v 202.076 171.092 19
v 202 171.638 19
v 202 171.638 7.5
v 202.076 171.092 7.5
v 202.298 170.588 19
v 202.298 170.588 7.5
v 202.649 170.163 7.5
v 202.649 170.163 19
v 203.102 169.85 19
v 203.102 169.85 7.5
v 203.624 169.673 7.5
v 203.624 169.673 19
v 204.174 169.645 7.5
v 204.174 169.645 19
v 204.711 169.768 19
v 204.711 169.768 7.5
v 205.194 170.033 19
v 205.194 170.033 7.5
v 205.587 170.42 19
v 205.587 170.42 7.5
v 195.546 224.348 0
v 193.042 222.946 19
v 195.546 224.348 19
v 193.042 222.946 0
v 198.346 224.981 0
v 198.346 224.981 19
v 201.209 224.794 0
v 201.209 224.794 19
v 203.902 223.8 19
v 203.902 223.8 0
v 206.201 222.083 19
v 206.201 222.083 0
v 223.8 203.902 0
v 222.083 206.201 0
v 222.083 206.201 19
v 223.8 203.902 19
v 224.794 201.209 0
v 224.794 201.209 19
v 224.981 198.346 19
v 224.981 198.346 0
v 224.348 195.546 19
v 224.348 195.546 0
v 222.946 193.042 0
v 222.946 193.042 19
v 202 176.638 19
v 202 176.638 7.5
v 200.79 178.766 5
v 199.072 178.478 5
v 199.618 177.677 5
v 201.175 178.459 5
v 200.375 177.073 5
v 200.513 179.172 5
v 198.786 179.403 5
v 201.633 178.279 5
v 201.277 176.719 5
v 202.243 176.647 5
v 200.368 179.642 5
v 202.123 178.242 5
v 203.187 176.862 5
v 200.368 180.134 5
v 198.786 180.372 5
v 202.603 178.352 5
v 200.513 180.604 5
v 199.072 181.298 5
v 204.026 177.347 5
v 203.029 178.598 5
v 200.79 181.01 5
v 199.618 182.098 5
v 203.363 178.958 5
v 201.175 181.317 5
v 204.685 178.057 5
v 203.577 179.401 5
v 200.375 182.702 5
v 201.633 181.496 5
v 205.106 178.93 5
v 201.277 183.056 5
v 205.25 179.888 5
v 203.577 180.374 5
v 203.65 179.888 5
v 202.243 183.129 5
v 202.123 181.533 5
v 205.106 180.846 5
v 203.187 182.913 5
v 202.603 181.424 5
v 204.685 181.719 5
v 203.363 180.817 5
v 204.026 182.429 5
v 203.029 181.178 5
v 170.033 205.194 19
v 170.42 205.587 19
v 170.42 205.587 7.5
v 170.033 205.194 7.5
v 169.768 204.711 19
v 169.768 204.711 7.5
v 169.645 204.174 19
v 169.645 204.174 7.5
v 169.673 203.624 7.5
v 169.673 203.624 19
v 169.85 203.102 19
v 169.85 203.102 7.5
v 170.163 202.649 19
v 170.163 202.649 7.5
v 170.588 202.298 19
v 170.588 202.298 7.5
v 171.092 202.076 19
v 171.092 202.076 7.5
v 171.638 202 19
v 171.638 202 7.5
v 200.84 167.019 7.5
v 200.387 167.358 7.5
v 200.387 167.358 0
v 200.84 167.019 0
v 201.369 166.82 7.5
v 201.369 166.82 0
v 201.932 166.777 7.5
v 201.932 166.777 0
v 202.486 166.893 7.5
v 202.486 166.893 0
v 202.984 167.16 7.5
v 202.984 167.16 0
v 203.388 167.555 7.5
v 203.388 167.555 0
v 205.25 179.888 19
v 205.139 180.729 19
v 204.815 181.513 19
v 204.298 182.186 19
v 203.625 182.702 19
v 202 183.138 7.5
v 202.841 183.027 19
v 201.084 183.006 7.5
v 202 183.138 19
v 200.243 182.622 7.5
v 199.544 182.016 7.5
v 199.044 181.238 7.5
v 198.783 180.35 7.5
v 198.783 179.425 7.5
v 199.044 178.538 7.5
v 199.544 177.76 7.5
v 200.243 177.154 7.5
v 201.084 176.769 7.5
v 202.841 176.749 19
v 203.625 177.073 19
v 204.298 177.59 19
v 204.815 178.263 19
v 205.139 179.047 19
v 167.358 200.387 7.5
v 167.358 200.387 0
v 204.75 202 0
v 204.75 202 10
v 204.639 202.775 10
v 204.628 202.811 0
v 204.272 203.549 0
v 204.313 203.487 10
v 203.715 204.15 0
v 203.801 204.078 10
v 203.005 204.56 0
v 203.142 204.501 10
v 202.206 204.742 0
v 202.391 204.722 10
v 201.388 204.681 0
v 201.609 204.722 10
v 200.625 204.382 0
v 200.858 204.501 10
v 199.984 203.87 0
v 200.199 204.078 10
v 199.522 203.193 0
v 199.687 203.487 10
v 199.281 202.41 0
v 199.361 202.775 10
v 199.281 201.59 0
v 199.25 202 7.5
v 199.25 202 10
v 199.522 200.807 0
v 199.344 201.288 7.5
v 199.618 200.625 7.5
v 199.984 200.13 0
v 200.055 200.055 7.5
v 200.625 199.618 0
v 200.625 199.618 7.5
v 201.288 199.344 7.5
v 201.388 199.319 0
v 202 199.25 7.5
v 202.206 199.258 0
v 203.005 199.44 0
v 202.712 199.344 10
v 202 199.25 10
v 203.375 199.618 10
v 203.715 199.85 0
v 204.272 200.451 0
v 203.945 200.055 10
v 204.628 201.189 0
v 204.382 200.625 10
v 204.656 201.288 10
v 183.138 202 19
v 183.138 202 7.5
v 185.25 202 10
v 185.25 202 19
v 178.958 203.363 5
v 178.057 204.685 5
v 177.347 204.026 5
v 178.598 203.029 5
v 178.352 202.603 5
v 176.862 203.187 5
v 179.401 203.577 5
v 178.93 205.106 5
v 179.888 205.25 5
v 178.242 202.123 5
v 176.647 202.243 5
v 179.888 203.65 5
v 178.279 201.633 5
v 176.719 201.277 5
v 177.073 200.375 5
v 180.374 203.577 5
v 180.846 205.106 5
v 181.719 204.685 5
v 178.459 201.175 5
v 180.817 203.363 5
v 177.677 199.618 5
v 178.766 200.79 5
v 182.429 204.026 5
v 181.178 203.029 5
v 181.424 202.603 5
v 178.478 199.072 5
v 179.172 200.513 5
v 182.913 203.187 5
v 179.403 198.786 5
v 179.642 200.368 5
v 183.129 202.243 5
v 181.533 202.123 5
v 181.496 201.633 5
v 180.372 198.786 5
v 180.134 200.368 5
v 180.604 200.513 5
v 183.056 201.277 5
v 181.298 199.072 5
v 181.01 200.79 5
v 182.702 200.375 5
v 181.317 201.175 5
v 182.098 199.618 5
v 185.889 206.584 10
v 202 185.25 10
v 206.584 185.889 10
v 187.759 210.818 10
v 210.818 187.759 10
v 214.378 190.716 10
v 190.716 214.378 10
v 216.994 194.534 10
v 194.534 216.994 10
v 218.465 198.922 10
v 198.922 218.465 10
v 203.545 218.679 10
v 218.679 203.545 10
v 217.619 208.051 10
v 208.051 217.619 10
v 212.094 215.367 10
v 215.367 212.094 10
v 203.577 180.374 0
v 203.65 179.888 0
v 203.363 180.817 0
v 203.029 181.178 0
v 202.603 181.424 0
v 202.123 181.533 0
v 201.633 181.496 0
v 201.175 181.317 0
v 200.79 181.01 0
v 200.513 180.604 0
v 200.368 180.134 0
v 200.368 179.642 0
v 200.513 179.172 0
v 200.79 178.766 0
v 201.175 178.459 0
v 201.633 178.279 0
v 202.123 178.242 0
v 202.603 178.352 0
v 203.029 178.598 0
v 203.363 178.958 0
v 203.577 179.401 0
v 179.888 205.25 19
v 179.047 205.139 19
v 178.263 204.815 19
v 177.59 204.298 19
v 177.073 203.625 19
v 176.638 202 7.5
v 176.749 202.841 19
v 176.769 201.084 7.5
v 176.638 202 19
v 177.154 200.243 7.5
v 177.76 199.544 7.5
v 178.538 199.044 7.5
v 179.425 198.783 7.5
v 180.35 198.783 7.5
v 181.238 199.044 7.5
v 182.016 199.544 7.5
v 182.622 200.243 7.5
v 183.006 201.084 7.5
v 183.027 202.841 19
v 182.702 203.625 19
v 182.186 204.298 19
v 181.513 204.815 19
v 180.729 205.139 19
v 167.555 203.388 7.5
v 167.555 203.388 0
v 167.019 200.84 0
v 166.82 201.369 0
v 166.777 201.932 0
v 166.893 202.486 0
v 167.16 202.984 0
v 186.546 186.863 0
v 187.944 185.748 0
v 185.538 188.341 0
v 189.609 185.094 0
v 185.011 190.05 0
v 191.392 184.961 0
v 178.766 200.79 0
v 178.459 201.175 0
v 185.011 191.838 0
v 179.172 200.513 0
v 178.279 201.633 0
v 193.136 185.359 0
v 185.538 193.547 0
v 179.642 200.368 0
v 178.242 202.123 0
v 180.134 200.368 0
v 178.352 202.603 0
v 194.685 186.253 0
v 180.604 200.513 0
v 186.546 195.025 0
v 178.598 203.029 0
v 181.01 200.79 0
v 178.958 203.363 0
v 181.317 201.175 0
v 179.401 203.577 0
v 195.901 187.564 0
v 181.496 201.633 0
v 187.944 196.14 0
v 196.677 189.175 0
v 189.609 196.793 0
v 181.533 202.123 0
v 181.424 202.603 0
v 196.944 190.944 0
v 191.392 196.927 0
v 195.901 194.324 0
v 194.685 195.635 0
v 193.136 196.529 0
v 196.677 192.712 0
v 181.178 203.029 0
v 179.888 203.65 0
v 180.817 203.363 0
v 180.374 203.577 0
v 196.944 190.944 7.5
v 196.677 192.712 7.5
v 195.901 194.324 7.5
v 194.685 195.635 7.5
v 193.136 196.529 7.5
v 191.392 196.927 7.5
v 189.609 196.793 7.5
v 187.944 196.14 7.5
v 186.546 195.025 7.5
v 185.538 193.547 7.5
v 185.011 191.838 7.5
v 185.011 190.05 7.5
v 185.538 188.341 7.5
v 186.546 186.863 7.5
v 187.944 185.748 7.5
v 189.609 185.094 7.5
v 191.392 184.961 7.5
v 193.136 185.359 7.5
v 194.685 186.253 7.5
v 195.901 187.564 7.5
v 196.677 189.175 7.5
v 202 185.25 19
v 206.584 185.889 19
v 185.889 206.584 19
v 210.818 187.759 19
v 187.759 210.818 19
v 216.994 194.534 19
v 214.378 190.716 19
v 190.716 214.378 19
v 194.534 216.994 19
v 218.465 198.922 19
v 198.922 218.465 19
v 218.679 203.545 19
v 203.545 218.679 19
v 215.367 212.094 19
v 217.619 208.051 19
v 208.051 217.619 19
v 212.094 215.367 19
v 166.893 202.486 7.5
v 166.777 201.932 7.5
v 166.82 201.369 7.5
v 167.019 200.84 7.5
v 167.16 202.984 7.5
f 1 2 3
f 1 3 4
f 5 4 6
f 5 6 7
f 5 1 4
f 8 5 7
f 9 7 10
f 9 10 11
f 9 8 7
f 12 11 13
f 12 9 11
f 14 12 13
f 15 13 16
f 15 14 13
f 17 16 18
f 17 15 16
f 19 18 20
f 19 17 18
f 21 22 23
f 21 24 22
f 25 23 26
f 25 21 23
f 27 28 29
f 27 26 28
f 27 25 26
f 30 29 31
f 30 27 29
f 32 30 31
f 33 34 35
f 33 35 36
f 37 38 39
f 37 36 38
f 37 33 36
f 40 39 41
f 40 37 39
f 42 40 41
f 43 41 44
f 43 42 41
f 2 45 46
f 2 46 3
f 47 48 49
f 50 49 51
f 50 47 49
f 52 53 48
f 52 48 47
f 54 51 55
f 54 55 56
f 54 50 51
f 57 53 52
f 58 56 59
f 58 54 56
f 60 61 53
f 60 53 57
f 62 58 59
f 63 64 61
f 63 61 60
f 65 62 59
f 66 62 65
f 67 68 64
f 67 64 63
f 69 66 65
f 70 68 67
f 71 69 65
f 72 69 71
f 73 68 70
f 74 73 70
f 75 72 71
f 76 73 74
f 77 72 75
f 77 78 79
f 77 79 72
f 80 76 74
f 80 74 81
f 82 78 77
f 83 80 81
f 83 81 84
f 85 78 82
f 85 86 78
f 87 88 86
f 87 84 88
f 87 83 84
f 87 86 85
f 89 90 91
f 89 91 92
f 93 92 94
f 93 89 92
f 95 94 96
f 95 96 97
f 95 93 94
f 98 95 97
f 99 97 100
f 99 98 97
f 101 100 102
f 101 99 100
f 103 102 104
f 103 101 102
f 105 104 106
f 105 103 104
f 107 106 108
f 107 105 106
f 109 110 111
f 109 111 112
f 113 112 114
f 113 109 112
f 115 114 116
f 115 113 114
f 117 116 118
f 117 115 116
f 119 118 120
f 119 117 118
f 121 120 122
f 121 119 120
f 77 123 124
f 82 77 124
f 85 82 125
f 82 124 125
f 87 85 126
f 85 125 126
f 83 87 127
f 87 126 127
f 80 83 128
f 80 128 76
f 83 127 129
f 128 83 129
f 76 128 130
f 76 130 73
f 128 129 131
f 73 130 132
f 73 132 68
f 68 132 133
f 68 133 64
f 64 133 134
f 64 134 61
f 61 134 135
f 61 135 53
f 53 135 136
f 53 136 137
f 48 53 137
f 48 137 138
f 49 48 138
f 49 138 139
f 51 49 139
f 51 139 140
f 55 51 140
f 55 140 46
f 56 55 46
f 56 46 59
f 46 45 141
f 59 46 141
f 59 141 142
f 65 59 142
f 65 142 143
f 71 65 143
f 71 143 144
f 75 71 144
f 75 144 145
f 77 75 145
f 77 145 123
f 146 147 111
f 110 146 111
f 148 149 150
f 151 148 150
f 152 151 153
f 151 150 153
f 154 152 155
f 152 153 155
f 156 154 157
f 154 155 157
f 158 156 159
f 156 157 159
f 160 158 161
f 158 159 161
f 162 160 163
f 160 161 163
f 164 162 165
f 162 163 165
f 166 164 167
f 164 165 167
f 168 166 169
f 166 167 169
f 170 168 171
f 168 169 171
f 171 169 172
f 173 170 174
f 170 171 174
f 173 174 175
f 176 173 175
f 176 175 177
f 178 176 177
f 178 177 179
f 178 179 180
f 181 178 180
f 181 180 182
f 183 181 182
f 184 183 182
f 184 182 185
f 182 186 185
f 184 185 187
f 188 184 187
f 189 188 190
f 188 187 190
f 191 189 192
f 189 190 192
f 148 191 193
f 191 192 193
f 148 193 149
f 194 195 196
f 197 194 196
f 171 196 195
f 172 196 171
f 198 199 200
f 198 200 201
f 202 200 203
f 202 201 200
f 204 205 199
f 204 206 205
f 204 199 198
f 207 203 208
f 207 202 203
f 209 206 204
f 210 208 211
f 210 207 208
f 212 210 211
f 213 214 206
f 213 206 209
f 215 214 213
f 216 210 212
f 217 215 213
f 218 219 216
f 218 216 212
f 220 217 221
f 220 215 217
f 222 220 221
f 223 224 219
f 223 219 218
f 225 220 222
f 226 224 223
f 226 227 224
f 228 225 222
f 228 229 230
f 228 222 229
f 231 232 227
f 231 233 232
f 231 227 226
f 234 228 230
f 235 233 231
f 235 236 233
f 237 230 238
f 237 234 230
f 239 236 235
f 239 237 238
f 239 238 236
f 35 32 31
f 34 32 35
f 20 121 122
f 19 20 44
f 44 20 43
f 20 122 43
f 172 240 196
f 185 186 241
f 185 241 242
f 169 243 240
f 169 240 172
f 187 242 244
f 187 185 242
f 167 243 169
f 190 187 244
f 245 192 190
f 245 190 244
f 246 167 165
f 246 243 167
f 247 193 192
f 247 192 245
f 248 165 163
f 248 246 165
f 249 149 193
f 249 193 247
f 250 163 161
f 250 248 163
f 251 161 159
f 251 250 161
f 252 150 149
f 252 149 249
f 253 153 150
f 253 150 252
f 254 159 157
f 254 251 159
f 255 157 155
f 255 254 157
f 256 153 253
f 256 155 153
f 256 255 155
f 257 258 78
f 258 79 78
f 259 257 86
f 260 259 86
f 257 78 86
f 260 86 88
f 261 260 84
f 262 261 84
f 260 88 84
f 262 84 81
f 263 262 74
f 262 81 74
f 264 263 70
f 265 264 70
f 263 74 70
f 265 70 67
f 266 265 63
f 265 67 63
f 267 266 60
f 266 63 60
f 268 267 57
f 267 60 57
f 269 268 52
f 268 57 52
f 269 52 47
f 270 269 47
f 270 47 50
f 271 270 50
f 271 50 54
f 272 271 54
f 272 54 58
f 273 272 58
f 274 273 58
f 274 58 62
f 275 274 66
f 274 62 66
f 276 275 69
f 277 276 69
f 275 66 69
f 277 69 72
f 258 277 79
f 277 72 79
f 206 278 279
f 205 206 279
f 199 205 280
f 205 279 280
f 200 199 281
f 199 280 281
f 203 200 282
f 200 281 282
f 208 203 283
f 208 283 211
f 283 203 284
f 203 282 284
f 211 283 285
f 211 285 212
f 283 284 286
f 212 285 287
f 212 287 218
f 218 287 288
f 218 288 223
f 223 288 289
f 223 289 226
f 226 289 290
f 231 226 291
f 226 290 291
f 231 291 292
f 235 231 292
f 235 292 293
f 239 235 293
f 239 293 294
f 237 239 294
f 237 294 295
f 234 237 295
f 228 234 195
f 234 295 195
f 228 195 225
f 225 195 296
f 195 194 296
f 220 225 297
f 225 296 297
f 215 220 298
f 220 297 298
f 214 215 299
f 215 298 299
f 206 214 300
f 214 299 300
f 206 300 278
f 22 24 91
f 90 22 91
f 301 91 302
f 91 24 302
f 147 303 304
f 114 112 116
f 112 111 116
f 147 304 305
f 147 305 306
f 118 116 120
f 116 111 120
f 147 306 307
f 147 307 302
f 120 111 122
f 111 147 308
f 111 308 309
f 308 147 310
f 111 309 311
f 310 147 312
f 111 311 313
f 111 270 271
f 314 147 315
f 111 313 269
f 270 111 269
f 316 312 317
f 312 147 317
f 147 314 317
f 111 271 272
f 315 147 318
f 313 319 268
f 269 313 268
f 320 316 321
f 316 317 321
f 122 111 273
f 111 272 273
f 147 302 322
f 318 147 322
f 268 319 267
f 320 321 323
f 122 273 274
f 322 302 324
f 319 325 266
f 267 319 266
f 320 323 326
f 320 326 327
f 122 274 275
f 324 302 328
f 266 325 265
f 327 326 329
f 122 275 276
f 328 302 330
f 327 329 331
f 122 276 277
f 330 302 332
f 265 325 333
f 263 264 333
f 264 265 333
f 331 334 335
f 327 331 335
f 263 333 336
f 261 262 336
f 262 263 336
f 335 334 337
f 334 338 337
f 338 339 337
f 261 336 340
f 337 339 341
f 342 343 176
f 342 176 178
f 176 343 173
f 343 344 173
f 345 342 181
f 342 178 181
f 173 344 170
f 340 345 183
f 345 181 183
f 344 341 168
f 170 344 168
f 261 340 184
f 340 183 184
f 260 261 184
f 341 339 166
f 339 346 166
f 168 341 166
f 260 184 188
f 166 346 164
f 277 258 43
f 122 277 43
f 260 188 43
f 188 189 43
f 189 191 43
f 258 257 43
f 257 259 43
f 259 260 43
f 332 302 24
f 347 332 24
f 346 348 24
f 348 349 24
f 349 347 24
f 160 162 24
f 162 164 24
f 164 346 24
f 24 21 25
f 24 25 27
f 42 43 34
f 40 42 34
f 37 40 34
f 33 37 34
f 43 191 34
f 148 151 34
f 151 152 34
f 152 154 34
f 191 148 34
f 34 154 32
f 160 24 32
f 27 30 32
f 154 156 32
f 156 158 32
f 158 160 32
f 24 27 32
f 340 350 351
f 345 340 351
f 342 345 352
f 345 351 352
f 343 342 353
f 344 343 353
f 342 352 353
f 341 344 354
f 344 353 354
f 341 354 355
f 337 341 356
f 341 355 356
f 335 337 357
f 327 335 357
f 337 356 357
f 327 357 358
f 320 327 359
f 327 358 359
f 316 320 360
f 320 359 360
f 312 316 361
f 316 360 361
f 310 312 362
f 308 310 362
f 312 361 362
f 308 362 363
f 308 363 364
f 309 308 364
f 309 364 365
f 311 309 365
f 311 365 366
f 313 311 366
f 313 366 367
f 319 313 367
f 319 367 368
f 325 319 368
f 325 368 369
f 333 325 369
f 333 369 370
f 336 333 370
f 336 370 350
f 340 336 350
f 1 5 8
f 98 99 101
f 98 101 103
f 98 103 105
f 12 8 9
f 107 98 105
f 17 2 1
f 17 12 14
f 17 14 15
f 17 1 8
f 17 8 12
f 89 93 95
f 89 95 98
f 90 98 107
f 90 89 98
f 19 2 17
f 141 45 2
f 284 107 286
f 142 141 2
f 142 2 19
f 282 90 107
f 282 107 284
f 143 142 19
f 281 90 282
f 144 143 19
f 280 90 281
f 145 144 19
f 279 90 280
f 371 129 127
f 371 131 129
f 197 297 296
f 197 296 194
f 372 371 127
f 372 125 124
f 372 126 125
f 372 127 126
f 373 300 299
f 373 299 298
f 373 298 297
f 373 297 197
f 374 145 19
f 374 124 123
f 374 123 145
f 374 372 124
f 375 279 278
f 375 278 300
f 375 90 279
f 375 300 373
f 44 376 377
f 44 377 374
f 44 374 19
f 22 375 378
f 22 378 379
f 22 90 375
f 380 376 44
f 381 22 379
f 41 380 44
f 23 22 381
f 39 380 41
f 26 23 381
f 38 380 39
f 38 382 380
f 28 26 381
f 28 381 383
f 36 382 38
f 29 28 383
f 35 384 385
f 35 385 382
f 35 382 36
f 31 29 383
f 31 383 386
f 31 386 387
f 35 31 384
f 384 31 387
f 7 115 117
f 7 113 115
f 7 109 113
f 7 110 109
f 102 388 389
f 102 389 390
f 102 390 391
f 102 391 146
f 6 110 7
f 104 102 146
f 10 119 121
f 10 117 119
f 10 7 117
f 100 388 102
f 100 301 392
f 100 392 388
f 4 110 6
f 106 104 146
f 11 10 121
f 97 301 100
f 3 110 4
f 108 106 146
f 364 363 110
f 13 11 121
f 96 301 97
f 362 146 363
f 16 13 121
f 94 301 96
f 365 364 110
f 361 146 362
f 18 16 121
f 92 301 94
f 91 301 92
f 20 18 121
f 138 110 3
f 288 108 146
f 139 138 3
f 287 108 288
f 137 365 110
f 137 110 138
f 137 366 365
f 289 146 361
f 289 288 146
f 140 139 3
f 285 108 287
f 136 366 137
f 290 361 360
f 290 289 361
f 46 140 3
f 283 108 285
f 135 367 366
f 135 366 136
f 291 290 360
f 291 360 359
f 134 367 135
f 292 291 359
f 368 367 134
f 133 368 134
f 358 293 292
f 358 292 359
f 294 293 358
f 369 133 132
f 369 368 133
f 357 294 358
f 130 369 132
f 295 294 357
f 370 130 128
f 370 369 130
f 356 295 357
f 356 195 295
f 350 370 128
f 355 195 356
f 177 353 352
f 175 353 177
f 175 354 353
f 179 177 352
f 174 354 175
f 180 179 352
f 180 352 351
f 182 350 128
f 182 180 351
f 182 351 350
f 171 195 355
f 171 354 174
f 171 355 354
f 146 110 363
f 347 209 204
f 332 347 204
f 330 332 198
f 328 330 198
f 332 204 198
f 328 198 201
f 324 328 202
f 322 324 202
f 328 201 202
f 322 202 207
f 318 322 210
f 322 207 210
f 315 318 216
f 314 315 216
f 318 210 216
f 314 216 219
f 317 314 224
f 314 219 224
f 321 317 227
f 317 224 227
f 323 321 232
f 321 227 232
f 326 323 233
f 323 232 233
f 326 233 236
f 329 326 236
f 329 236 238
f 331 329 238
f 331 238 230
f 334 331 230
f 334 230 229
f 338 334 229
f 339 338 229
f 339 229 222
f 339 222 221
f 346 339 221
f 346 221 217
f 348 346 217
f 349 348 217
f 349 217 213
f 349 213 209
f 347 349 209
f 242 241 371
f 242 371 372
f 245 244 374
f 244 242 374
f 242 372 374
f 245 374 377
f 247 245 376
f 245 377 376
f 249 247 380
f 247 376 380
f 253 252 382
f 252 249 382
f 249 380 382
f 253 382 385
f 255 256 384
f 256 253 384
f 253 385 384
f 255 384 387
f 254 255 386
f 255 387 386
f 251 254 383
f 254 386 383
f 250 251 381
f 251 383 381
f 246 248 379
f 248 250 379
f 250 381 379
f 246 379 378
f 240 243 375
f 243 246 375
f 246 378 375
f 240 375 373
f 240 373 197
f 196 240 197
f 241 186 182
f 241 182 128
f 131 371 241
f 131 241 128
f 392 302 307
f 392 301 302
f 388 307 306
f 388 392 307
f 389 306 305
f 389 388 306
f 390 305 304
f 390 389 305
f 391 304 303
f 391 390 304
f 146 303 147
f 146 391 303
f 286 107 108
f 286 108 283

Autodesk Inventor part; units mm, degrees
ref_plane "YZ Plane" through (0, 0, 0) normal (1, 0, 0) x (0, 1, 0)
ref_plane "XZ Plane" through (0, 0, 0) normal (0, 1, 0) x (-1, 0, 0)
sketch "Sketch1" plane through (0, 0, 0) normal (0, 0, 1) x (1, 0, 0)
  line L0 (202, 202) -> (202, 0) construction
  line L1 (0, 202) -> (202, 202) construction
  arc A0 (206.2012, 222.0831) -> (193.0425, 222.9456) centre (199.1301, 215.012) ccw projected
  arc A1 (222.9456, 193.0425) -> (222.0831, 206.2012) centre (215.012, 199.1301) ccw projected
  line L2 (206.2012, 222.0831) -> (222.0831, 206.2012)
  line L3 (193.0425, 222.9456) -> (165.7457, 202)
  line L4 (202, 165.7457) -> (222.9456, 193.0425)
  line L5 (165.7457, 202) -> (202, 165.7457)
  point P0 (0, 0)
extrude "Extrusion3" add sketch "Sketch1" along normal blind 19
sketch "Sketch3" plane through (0, 0, 19) normal (0, 0, 1) x (1, 0, 0)
  line L0 (165.7457, 202) -> (202, 202)
  line L1 (202, 202) -> (202, 165.7457)
  line L2 (165.7457, 202) -> (202, 165.7457)
  point P0 (0, 0)
extrude "Extrusion4" cut sketch "Sketch3" against normal blind 11.5
sketch "Sketch5" plane through (0, 0, 19) normal (0, 0, 1) x (1, 0, 0)
  line L0 (222.0831, 206.2012) -> (206.2012, 222.0831) construction
  line L1 (214.1421, 214.1421) -> (134.2284, 134.2284) construction
  line L2 (202, 165.7457) -> (165.7457, 202) construction
  circle A0 centre (190.9439, 190.9439) radius 6
  point P0 (0, 0)
  dimension "d25" = 12
  dimension "d26" = 10
extrude "Extrusion6" cut sketch "Sketch5" against normal through all
sketch "Sketch6" plane through (0, 0, 19) normal (0, 0, 1) x (1, 0, 0)
  circle A0 centre (202, 202) radius 2.75
  point P0 (0, 0)
  dimension "d27" = 5.5
extrude "Extrusion7" cut sketch "Sketch6" against normal through all
sketch "Sketch7" plane through (0, 0, 19) normal (0, 0, 1) x (1, 0, 0)
  arc A0 (202, 199.25) -> (199.25, 202) centre (202, 202) ccw construction
  circle A1 centre (202, 202) radius 16.75
  point P0 (0, 0)
  dimension "d30" = 33.5
extrude "Extrusion8" cut sketch "Sketch7" against normal blind 9
sketch "Sketch8" plane through (0, 0, 19) normal (0, 0, 1) x (1, 0, 0)
  line L0 (202, 185.25) -> (202, 165.7457) construction
  circle A0 centre (190.9439, 190.9439) radius 6 construction
  line L1 (202, 165.7457) -> (165.7457, 202) construction
  line L2 (163.0953, 218.7925) -> (219.2426, 162.6452) construction
  circle A1 centre (202, 179.8878) radius 1.65
  point P0 (0, 0)
  dimension "d33" = 3.3
extrude "Extrusion9" cut sketch "Sketch8" against normal through all
sketch "Sketch9" plane through (0, 0, 19) normal (0, 0, 1) x (1, 0, 0)
  arc A0 (202, 178.2378) -> (202, 181.5378) centre (202, 179.8878) ccw construction
  circle A1 centre (202, 179.8878) radius 3.25
  point P0 (0, 0)
  dimension "d36" = 6.5
extrude "Extrusion10" cut sketch "Sketch9" against normal blind 14
ref_plane "Work Plane1" through (183.8728, 183.8728, 7.5) normal (0.7071, -0.7071, 0) x (0, 0, -1)
mirror "Mirror1" about plane through (183.8728, 183.8728, 7.5) normal (0.7071, -0.7071, 0) of "Extrusion9", "Extrusion10"
fillet "Fillet6" radius 2 4 edges at (165.7457, 202, 13.25) (165.7457, 202, 3.75) (202, 165.7457, 13.25) (202, 165.7457, 3.75)
sketch "Sketch10" plane through (0, 0, 10) normal (0, 0, 1) x (1, 0, 0)
  line L0 (202, 185.25) -> (202, 199.25) projected
  arc A0 (202, 185.25) -> (185.25, 202) centre (202, 202) ccw projected
  line L1 (199.25, 202) -> (185.25, 202) projected
  arc A1 (202, 199.25) -> (199.25, 202) centre (202, 202) ccw projected
  point P0 (0, 0)
properties part number "leveling clip"
